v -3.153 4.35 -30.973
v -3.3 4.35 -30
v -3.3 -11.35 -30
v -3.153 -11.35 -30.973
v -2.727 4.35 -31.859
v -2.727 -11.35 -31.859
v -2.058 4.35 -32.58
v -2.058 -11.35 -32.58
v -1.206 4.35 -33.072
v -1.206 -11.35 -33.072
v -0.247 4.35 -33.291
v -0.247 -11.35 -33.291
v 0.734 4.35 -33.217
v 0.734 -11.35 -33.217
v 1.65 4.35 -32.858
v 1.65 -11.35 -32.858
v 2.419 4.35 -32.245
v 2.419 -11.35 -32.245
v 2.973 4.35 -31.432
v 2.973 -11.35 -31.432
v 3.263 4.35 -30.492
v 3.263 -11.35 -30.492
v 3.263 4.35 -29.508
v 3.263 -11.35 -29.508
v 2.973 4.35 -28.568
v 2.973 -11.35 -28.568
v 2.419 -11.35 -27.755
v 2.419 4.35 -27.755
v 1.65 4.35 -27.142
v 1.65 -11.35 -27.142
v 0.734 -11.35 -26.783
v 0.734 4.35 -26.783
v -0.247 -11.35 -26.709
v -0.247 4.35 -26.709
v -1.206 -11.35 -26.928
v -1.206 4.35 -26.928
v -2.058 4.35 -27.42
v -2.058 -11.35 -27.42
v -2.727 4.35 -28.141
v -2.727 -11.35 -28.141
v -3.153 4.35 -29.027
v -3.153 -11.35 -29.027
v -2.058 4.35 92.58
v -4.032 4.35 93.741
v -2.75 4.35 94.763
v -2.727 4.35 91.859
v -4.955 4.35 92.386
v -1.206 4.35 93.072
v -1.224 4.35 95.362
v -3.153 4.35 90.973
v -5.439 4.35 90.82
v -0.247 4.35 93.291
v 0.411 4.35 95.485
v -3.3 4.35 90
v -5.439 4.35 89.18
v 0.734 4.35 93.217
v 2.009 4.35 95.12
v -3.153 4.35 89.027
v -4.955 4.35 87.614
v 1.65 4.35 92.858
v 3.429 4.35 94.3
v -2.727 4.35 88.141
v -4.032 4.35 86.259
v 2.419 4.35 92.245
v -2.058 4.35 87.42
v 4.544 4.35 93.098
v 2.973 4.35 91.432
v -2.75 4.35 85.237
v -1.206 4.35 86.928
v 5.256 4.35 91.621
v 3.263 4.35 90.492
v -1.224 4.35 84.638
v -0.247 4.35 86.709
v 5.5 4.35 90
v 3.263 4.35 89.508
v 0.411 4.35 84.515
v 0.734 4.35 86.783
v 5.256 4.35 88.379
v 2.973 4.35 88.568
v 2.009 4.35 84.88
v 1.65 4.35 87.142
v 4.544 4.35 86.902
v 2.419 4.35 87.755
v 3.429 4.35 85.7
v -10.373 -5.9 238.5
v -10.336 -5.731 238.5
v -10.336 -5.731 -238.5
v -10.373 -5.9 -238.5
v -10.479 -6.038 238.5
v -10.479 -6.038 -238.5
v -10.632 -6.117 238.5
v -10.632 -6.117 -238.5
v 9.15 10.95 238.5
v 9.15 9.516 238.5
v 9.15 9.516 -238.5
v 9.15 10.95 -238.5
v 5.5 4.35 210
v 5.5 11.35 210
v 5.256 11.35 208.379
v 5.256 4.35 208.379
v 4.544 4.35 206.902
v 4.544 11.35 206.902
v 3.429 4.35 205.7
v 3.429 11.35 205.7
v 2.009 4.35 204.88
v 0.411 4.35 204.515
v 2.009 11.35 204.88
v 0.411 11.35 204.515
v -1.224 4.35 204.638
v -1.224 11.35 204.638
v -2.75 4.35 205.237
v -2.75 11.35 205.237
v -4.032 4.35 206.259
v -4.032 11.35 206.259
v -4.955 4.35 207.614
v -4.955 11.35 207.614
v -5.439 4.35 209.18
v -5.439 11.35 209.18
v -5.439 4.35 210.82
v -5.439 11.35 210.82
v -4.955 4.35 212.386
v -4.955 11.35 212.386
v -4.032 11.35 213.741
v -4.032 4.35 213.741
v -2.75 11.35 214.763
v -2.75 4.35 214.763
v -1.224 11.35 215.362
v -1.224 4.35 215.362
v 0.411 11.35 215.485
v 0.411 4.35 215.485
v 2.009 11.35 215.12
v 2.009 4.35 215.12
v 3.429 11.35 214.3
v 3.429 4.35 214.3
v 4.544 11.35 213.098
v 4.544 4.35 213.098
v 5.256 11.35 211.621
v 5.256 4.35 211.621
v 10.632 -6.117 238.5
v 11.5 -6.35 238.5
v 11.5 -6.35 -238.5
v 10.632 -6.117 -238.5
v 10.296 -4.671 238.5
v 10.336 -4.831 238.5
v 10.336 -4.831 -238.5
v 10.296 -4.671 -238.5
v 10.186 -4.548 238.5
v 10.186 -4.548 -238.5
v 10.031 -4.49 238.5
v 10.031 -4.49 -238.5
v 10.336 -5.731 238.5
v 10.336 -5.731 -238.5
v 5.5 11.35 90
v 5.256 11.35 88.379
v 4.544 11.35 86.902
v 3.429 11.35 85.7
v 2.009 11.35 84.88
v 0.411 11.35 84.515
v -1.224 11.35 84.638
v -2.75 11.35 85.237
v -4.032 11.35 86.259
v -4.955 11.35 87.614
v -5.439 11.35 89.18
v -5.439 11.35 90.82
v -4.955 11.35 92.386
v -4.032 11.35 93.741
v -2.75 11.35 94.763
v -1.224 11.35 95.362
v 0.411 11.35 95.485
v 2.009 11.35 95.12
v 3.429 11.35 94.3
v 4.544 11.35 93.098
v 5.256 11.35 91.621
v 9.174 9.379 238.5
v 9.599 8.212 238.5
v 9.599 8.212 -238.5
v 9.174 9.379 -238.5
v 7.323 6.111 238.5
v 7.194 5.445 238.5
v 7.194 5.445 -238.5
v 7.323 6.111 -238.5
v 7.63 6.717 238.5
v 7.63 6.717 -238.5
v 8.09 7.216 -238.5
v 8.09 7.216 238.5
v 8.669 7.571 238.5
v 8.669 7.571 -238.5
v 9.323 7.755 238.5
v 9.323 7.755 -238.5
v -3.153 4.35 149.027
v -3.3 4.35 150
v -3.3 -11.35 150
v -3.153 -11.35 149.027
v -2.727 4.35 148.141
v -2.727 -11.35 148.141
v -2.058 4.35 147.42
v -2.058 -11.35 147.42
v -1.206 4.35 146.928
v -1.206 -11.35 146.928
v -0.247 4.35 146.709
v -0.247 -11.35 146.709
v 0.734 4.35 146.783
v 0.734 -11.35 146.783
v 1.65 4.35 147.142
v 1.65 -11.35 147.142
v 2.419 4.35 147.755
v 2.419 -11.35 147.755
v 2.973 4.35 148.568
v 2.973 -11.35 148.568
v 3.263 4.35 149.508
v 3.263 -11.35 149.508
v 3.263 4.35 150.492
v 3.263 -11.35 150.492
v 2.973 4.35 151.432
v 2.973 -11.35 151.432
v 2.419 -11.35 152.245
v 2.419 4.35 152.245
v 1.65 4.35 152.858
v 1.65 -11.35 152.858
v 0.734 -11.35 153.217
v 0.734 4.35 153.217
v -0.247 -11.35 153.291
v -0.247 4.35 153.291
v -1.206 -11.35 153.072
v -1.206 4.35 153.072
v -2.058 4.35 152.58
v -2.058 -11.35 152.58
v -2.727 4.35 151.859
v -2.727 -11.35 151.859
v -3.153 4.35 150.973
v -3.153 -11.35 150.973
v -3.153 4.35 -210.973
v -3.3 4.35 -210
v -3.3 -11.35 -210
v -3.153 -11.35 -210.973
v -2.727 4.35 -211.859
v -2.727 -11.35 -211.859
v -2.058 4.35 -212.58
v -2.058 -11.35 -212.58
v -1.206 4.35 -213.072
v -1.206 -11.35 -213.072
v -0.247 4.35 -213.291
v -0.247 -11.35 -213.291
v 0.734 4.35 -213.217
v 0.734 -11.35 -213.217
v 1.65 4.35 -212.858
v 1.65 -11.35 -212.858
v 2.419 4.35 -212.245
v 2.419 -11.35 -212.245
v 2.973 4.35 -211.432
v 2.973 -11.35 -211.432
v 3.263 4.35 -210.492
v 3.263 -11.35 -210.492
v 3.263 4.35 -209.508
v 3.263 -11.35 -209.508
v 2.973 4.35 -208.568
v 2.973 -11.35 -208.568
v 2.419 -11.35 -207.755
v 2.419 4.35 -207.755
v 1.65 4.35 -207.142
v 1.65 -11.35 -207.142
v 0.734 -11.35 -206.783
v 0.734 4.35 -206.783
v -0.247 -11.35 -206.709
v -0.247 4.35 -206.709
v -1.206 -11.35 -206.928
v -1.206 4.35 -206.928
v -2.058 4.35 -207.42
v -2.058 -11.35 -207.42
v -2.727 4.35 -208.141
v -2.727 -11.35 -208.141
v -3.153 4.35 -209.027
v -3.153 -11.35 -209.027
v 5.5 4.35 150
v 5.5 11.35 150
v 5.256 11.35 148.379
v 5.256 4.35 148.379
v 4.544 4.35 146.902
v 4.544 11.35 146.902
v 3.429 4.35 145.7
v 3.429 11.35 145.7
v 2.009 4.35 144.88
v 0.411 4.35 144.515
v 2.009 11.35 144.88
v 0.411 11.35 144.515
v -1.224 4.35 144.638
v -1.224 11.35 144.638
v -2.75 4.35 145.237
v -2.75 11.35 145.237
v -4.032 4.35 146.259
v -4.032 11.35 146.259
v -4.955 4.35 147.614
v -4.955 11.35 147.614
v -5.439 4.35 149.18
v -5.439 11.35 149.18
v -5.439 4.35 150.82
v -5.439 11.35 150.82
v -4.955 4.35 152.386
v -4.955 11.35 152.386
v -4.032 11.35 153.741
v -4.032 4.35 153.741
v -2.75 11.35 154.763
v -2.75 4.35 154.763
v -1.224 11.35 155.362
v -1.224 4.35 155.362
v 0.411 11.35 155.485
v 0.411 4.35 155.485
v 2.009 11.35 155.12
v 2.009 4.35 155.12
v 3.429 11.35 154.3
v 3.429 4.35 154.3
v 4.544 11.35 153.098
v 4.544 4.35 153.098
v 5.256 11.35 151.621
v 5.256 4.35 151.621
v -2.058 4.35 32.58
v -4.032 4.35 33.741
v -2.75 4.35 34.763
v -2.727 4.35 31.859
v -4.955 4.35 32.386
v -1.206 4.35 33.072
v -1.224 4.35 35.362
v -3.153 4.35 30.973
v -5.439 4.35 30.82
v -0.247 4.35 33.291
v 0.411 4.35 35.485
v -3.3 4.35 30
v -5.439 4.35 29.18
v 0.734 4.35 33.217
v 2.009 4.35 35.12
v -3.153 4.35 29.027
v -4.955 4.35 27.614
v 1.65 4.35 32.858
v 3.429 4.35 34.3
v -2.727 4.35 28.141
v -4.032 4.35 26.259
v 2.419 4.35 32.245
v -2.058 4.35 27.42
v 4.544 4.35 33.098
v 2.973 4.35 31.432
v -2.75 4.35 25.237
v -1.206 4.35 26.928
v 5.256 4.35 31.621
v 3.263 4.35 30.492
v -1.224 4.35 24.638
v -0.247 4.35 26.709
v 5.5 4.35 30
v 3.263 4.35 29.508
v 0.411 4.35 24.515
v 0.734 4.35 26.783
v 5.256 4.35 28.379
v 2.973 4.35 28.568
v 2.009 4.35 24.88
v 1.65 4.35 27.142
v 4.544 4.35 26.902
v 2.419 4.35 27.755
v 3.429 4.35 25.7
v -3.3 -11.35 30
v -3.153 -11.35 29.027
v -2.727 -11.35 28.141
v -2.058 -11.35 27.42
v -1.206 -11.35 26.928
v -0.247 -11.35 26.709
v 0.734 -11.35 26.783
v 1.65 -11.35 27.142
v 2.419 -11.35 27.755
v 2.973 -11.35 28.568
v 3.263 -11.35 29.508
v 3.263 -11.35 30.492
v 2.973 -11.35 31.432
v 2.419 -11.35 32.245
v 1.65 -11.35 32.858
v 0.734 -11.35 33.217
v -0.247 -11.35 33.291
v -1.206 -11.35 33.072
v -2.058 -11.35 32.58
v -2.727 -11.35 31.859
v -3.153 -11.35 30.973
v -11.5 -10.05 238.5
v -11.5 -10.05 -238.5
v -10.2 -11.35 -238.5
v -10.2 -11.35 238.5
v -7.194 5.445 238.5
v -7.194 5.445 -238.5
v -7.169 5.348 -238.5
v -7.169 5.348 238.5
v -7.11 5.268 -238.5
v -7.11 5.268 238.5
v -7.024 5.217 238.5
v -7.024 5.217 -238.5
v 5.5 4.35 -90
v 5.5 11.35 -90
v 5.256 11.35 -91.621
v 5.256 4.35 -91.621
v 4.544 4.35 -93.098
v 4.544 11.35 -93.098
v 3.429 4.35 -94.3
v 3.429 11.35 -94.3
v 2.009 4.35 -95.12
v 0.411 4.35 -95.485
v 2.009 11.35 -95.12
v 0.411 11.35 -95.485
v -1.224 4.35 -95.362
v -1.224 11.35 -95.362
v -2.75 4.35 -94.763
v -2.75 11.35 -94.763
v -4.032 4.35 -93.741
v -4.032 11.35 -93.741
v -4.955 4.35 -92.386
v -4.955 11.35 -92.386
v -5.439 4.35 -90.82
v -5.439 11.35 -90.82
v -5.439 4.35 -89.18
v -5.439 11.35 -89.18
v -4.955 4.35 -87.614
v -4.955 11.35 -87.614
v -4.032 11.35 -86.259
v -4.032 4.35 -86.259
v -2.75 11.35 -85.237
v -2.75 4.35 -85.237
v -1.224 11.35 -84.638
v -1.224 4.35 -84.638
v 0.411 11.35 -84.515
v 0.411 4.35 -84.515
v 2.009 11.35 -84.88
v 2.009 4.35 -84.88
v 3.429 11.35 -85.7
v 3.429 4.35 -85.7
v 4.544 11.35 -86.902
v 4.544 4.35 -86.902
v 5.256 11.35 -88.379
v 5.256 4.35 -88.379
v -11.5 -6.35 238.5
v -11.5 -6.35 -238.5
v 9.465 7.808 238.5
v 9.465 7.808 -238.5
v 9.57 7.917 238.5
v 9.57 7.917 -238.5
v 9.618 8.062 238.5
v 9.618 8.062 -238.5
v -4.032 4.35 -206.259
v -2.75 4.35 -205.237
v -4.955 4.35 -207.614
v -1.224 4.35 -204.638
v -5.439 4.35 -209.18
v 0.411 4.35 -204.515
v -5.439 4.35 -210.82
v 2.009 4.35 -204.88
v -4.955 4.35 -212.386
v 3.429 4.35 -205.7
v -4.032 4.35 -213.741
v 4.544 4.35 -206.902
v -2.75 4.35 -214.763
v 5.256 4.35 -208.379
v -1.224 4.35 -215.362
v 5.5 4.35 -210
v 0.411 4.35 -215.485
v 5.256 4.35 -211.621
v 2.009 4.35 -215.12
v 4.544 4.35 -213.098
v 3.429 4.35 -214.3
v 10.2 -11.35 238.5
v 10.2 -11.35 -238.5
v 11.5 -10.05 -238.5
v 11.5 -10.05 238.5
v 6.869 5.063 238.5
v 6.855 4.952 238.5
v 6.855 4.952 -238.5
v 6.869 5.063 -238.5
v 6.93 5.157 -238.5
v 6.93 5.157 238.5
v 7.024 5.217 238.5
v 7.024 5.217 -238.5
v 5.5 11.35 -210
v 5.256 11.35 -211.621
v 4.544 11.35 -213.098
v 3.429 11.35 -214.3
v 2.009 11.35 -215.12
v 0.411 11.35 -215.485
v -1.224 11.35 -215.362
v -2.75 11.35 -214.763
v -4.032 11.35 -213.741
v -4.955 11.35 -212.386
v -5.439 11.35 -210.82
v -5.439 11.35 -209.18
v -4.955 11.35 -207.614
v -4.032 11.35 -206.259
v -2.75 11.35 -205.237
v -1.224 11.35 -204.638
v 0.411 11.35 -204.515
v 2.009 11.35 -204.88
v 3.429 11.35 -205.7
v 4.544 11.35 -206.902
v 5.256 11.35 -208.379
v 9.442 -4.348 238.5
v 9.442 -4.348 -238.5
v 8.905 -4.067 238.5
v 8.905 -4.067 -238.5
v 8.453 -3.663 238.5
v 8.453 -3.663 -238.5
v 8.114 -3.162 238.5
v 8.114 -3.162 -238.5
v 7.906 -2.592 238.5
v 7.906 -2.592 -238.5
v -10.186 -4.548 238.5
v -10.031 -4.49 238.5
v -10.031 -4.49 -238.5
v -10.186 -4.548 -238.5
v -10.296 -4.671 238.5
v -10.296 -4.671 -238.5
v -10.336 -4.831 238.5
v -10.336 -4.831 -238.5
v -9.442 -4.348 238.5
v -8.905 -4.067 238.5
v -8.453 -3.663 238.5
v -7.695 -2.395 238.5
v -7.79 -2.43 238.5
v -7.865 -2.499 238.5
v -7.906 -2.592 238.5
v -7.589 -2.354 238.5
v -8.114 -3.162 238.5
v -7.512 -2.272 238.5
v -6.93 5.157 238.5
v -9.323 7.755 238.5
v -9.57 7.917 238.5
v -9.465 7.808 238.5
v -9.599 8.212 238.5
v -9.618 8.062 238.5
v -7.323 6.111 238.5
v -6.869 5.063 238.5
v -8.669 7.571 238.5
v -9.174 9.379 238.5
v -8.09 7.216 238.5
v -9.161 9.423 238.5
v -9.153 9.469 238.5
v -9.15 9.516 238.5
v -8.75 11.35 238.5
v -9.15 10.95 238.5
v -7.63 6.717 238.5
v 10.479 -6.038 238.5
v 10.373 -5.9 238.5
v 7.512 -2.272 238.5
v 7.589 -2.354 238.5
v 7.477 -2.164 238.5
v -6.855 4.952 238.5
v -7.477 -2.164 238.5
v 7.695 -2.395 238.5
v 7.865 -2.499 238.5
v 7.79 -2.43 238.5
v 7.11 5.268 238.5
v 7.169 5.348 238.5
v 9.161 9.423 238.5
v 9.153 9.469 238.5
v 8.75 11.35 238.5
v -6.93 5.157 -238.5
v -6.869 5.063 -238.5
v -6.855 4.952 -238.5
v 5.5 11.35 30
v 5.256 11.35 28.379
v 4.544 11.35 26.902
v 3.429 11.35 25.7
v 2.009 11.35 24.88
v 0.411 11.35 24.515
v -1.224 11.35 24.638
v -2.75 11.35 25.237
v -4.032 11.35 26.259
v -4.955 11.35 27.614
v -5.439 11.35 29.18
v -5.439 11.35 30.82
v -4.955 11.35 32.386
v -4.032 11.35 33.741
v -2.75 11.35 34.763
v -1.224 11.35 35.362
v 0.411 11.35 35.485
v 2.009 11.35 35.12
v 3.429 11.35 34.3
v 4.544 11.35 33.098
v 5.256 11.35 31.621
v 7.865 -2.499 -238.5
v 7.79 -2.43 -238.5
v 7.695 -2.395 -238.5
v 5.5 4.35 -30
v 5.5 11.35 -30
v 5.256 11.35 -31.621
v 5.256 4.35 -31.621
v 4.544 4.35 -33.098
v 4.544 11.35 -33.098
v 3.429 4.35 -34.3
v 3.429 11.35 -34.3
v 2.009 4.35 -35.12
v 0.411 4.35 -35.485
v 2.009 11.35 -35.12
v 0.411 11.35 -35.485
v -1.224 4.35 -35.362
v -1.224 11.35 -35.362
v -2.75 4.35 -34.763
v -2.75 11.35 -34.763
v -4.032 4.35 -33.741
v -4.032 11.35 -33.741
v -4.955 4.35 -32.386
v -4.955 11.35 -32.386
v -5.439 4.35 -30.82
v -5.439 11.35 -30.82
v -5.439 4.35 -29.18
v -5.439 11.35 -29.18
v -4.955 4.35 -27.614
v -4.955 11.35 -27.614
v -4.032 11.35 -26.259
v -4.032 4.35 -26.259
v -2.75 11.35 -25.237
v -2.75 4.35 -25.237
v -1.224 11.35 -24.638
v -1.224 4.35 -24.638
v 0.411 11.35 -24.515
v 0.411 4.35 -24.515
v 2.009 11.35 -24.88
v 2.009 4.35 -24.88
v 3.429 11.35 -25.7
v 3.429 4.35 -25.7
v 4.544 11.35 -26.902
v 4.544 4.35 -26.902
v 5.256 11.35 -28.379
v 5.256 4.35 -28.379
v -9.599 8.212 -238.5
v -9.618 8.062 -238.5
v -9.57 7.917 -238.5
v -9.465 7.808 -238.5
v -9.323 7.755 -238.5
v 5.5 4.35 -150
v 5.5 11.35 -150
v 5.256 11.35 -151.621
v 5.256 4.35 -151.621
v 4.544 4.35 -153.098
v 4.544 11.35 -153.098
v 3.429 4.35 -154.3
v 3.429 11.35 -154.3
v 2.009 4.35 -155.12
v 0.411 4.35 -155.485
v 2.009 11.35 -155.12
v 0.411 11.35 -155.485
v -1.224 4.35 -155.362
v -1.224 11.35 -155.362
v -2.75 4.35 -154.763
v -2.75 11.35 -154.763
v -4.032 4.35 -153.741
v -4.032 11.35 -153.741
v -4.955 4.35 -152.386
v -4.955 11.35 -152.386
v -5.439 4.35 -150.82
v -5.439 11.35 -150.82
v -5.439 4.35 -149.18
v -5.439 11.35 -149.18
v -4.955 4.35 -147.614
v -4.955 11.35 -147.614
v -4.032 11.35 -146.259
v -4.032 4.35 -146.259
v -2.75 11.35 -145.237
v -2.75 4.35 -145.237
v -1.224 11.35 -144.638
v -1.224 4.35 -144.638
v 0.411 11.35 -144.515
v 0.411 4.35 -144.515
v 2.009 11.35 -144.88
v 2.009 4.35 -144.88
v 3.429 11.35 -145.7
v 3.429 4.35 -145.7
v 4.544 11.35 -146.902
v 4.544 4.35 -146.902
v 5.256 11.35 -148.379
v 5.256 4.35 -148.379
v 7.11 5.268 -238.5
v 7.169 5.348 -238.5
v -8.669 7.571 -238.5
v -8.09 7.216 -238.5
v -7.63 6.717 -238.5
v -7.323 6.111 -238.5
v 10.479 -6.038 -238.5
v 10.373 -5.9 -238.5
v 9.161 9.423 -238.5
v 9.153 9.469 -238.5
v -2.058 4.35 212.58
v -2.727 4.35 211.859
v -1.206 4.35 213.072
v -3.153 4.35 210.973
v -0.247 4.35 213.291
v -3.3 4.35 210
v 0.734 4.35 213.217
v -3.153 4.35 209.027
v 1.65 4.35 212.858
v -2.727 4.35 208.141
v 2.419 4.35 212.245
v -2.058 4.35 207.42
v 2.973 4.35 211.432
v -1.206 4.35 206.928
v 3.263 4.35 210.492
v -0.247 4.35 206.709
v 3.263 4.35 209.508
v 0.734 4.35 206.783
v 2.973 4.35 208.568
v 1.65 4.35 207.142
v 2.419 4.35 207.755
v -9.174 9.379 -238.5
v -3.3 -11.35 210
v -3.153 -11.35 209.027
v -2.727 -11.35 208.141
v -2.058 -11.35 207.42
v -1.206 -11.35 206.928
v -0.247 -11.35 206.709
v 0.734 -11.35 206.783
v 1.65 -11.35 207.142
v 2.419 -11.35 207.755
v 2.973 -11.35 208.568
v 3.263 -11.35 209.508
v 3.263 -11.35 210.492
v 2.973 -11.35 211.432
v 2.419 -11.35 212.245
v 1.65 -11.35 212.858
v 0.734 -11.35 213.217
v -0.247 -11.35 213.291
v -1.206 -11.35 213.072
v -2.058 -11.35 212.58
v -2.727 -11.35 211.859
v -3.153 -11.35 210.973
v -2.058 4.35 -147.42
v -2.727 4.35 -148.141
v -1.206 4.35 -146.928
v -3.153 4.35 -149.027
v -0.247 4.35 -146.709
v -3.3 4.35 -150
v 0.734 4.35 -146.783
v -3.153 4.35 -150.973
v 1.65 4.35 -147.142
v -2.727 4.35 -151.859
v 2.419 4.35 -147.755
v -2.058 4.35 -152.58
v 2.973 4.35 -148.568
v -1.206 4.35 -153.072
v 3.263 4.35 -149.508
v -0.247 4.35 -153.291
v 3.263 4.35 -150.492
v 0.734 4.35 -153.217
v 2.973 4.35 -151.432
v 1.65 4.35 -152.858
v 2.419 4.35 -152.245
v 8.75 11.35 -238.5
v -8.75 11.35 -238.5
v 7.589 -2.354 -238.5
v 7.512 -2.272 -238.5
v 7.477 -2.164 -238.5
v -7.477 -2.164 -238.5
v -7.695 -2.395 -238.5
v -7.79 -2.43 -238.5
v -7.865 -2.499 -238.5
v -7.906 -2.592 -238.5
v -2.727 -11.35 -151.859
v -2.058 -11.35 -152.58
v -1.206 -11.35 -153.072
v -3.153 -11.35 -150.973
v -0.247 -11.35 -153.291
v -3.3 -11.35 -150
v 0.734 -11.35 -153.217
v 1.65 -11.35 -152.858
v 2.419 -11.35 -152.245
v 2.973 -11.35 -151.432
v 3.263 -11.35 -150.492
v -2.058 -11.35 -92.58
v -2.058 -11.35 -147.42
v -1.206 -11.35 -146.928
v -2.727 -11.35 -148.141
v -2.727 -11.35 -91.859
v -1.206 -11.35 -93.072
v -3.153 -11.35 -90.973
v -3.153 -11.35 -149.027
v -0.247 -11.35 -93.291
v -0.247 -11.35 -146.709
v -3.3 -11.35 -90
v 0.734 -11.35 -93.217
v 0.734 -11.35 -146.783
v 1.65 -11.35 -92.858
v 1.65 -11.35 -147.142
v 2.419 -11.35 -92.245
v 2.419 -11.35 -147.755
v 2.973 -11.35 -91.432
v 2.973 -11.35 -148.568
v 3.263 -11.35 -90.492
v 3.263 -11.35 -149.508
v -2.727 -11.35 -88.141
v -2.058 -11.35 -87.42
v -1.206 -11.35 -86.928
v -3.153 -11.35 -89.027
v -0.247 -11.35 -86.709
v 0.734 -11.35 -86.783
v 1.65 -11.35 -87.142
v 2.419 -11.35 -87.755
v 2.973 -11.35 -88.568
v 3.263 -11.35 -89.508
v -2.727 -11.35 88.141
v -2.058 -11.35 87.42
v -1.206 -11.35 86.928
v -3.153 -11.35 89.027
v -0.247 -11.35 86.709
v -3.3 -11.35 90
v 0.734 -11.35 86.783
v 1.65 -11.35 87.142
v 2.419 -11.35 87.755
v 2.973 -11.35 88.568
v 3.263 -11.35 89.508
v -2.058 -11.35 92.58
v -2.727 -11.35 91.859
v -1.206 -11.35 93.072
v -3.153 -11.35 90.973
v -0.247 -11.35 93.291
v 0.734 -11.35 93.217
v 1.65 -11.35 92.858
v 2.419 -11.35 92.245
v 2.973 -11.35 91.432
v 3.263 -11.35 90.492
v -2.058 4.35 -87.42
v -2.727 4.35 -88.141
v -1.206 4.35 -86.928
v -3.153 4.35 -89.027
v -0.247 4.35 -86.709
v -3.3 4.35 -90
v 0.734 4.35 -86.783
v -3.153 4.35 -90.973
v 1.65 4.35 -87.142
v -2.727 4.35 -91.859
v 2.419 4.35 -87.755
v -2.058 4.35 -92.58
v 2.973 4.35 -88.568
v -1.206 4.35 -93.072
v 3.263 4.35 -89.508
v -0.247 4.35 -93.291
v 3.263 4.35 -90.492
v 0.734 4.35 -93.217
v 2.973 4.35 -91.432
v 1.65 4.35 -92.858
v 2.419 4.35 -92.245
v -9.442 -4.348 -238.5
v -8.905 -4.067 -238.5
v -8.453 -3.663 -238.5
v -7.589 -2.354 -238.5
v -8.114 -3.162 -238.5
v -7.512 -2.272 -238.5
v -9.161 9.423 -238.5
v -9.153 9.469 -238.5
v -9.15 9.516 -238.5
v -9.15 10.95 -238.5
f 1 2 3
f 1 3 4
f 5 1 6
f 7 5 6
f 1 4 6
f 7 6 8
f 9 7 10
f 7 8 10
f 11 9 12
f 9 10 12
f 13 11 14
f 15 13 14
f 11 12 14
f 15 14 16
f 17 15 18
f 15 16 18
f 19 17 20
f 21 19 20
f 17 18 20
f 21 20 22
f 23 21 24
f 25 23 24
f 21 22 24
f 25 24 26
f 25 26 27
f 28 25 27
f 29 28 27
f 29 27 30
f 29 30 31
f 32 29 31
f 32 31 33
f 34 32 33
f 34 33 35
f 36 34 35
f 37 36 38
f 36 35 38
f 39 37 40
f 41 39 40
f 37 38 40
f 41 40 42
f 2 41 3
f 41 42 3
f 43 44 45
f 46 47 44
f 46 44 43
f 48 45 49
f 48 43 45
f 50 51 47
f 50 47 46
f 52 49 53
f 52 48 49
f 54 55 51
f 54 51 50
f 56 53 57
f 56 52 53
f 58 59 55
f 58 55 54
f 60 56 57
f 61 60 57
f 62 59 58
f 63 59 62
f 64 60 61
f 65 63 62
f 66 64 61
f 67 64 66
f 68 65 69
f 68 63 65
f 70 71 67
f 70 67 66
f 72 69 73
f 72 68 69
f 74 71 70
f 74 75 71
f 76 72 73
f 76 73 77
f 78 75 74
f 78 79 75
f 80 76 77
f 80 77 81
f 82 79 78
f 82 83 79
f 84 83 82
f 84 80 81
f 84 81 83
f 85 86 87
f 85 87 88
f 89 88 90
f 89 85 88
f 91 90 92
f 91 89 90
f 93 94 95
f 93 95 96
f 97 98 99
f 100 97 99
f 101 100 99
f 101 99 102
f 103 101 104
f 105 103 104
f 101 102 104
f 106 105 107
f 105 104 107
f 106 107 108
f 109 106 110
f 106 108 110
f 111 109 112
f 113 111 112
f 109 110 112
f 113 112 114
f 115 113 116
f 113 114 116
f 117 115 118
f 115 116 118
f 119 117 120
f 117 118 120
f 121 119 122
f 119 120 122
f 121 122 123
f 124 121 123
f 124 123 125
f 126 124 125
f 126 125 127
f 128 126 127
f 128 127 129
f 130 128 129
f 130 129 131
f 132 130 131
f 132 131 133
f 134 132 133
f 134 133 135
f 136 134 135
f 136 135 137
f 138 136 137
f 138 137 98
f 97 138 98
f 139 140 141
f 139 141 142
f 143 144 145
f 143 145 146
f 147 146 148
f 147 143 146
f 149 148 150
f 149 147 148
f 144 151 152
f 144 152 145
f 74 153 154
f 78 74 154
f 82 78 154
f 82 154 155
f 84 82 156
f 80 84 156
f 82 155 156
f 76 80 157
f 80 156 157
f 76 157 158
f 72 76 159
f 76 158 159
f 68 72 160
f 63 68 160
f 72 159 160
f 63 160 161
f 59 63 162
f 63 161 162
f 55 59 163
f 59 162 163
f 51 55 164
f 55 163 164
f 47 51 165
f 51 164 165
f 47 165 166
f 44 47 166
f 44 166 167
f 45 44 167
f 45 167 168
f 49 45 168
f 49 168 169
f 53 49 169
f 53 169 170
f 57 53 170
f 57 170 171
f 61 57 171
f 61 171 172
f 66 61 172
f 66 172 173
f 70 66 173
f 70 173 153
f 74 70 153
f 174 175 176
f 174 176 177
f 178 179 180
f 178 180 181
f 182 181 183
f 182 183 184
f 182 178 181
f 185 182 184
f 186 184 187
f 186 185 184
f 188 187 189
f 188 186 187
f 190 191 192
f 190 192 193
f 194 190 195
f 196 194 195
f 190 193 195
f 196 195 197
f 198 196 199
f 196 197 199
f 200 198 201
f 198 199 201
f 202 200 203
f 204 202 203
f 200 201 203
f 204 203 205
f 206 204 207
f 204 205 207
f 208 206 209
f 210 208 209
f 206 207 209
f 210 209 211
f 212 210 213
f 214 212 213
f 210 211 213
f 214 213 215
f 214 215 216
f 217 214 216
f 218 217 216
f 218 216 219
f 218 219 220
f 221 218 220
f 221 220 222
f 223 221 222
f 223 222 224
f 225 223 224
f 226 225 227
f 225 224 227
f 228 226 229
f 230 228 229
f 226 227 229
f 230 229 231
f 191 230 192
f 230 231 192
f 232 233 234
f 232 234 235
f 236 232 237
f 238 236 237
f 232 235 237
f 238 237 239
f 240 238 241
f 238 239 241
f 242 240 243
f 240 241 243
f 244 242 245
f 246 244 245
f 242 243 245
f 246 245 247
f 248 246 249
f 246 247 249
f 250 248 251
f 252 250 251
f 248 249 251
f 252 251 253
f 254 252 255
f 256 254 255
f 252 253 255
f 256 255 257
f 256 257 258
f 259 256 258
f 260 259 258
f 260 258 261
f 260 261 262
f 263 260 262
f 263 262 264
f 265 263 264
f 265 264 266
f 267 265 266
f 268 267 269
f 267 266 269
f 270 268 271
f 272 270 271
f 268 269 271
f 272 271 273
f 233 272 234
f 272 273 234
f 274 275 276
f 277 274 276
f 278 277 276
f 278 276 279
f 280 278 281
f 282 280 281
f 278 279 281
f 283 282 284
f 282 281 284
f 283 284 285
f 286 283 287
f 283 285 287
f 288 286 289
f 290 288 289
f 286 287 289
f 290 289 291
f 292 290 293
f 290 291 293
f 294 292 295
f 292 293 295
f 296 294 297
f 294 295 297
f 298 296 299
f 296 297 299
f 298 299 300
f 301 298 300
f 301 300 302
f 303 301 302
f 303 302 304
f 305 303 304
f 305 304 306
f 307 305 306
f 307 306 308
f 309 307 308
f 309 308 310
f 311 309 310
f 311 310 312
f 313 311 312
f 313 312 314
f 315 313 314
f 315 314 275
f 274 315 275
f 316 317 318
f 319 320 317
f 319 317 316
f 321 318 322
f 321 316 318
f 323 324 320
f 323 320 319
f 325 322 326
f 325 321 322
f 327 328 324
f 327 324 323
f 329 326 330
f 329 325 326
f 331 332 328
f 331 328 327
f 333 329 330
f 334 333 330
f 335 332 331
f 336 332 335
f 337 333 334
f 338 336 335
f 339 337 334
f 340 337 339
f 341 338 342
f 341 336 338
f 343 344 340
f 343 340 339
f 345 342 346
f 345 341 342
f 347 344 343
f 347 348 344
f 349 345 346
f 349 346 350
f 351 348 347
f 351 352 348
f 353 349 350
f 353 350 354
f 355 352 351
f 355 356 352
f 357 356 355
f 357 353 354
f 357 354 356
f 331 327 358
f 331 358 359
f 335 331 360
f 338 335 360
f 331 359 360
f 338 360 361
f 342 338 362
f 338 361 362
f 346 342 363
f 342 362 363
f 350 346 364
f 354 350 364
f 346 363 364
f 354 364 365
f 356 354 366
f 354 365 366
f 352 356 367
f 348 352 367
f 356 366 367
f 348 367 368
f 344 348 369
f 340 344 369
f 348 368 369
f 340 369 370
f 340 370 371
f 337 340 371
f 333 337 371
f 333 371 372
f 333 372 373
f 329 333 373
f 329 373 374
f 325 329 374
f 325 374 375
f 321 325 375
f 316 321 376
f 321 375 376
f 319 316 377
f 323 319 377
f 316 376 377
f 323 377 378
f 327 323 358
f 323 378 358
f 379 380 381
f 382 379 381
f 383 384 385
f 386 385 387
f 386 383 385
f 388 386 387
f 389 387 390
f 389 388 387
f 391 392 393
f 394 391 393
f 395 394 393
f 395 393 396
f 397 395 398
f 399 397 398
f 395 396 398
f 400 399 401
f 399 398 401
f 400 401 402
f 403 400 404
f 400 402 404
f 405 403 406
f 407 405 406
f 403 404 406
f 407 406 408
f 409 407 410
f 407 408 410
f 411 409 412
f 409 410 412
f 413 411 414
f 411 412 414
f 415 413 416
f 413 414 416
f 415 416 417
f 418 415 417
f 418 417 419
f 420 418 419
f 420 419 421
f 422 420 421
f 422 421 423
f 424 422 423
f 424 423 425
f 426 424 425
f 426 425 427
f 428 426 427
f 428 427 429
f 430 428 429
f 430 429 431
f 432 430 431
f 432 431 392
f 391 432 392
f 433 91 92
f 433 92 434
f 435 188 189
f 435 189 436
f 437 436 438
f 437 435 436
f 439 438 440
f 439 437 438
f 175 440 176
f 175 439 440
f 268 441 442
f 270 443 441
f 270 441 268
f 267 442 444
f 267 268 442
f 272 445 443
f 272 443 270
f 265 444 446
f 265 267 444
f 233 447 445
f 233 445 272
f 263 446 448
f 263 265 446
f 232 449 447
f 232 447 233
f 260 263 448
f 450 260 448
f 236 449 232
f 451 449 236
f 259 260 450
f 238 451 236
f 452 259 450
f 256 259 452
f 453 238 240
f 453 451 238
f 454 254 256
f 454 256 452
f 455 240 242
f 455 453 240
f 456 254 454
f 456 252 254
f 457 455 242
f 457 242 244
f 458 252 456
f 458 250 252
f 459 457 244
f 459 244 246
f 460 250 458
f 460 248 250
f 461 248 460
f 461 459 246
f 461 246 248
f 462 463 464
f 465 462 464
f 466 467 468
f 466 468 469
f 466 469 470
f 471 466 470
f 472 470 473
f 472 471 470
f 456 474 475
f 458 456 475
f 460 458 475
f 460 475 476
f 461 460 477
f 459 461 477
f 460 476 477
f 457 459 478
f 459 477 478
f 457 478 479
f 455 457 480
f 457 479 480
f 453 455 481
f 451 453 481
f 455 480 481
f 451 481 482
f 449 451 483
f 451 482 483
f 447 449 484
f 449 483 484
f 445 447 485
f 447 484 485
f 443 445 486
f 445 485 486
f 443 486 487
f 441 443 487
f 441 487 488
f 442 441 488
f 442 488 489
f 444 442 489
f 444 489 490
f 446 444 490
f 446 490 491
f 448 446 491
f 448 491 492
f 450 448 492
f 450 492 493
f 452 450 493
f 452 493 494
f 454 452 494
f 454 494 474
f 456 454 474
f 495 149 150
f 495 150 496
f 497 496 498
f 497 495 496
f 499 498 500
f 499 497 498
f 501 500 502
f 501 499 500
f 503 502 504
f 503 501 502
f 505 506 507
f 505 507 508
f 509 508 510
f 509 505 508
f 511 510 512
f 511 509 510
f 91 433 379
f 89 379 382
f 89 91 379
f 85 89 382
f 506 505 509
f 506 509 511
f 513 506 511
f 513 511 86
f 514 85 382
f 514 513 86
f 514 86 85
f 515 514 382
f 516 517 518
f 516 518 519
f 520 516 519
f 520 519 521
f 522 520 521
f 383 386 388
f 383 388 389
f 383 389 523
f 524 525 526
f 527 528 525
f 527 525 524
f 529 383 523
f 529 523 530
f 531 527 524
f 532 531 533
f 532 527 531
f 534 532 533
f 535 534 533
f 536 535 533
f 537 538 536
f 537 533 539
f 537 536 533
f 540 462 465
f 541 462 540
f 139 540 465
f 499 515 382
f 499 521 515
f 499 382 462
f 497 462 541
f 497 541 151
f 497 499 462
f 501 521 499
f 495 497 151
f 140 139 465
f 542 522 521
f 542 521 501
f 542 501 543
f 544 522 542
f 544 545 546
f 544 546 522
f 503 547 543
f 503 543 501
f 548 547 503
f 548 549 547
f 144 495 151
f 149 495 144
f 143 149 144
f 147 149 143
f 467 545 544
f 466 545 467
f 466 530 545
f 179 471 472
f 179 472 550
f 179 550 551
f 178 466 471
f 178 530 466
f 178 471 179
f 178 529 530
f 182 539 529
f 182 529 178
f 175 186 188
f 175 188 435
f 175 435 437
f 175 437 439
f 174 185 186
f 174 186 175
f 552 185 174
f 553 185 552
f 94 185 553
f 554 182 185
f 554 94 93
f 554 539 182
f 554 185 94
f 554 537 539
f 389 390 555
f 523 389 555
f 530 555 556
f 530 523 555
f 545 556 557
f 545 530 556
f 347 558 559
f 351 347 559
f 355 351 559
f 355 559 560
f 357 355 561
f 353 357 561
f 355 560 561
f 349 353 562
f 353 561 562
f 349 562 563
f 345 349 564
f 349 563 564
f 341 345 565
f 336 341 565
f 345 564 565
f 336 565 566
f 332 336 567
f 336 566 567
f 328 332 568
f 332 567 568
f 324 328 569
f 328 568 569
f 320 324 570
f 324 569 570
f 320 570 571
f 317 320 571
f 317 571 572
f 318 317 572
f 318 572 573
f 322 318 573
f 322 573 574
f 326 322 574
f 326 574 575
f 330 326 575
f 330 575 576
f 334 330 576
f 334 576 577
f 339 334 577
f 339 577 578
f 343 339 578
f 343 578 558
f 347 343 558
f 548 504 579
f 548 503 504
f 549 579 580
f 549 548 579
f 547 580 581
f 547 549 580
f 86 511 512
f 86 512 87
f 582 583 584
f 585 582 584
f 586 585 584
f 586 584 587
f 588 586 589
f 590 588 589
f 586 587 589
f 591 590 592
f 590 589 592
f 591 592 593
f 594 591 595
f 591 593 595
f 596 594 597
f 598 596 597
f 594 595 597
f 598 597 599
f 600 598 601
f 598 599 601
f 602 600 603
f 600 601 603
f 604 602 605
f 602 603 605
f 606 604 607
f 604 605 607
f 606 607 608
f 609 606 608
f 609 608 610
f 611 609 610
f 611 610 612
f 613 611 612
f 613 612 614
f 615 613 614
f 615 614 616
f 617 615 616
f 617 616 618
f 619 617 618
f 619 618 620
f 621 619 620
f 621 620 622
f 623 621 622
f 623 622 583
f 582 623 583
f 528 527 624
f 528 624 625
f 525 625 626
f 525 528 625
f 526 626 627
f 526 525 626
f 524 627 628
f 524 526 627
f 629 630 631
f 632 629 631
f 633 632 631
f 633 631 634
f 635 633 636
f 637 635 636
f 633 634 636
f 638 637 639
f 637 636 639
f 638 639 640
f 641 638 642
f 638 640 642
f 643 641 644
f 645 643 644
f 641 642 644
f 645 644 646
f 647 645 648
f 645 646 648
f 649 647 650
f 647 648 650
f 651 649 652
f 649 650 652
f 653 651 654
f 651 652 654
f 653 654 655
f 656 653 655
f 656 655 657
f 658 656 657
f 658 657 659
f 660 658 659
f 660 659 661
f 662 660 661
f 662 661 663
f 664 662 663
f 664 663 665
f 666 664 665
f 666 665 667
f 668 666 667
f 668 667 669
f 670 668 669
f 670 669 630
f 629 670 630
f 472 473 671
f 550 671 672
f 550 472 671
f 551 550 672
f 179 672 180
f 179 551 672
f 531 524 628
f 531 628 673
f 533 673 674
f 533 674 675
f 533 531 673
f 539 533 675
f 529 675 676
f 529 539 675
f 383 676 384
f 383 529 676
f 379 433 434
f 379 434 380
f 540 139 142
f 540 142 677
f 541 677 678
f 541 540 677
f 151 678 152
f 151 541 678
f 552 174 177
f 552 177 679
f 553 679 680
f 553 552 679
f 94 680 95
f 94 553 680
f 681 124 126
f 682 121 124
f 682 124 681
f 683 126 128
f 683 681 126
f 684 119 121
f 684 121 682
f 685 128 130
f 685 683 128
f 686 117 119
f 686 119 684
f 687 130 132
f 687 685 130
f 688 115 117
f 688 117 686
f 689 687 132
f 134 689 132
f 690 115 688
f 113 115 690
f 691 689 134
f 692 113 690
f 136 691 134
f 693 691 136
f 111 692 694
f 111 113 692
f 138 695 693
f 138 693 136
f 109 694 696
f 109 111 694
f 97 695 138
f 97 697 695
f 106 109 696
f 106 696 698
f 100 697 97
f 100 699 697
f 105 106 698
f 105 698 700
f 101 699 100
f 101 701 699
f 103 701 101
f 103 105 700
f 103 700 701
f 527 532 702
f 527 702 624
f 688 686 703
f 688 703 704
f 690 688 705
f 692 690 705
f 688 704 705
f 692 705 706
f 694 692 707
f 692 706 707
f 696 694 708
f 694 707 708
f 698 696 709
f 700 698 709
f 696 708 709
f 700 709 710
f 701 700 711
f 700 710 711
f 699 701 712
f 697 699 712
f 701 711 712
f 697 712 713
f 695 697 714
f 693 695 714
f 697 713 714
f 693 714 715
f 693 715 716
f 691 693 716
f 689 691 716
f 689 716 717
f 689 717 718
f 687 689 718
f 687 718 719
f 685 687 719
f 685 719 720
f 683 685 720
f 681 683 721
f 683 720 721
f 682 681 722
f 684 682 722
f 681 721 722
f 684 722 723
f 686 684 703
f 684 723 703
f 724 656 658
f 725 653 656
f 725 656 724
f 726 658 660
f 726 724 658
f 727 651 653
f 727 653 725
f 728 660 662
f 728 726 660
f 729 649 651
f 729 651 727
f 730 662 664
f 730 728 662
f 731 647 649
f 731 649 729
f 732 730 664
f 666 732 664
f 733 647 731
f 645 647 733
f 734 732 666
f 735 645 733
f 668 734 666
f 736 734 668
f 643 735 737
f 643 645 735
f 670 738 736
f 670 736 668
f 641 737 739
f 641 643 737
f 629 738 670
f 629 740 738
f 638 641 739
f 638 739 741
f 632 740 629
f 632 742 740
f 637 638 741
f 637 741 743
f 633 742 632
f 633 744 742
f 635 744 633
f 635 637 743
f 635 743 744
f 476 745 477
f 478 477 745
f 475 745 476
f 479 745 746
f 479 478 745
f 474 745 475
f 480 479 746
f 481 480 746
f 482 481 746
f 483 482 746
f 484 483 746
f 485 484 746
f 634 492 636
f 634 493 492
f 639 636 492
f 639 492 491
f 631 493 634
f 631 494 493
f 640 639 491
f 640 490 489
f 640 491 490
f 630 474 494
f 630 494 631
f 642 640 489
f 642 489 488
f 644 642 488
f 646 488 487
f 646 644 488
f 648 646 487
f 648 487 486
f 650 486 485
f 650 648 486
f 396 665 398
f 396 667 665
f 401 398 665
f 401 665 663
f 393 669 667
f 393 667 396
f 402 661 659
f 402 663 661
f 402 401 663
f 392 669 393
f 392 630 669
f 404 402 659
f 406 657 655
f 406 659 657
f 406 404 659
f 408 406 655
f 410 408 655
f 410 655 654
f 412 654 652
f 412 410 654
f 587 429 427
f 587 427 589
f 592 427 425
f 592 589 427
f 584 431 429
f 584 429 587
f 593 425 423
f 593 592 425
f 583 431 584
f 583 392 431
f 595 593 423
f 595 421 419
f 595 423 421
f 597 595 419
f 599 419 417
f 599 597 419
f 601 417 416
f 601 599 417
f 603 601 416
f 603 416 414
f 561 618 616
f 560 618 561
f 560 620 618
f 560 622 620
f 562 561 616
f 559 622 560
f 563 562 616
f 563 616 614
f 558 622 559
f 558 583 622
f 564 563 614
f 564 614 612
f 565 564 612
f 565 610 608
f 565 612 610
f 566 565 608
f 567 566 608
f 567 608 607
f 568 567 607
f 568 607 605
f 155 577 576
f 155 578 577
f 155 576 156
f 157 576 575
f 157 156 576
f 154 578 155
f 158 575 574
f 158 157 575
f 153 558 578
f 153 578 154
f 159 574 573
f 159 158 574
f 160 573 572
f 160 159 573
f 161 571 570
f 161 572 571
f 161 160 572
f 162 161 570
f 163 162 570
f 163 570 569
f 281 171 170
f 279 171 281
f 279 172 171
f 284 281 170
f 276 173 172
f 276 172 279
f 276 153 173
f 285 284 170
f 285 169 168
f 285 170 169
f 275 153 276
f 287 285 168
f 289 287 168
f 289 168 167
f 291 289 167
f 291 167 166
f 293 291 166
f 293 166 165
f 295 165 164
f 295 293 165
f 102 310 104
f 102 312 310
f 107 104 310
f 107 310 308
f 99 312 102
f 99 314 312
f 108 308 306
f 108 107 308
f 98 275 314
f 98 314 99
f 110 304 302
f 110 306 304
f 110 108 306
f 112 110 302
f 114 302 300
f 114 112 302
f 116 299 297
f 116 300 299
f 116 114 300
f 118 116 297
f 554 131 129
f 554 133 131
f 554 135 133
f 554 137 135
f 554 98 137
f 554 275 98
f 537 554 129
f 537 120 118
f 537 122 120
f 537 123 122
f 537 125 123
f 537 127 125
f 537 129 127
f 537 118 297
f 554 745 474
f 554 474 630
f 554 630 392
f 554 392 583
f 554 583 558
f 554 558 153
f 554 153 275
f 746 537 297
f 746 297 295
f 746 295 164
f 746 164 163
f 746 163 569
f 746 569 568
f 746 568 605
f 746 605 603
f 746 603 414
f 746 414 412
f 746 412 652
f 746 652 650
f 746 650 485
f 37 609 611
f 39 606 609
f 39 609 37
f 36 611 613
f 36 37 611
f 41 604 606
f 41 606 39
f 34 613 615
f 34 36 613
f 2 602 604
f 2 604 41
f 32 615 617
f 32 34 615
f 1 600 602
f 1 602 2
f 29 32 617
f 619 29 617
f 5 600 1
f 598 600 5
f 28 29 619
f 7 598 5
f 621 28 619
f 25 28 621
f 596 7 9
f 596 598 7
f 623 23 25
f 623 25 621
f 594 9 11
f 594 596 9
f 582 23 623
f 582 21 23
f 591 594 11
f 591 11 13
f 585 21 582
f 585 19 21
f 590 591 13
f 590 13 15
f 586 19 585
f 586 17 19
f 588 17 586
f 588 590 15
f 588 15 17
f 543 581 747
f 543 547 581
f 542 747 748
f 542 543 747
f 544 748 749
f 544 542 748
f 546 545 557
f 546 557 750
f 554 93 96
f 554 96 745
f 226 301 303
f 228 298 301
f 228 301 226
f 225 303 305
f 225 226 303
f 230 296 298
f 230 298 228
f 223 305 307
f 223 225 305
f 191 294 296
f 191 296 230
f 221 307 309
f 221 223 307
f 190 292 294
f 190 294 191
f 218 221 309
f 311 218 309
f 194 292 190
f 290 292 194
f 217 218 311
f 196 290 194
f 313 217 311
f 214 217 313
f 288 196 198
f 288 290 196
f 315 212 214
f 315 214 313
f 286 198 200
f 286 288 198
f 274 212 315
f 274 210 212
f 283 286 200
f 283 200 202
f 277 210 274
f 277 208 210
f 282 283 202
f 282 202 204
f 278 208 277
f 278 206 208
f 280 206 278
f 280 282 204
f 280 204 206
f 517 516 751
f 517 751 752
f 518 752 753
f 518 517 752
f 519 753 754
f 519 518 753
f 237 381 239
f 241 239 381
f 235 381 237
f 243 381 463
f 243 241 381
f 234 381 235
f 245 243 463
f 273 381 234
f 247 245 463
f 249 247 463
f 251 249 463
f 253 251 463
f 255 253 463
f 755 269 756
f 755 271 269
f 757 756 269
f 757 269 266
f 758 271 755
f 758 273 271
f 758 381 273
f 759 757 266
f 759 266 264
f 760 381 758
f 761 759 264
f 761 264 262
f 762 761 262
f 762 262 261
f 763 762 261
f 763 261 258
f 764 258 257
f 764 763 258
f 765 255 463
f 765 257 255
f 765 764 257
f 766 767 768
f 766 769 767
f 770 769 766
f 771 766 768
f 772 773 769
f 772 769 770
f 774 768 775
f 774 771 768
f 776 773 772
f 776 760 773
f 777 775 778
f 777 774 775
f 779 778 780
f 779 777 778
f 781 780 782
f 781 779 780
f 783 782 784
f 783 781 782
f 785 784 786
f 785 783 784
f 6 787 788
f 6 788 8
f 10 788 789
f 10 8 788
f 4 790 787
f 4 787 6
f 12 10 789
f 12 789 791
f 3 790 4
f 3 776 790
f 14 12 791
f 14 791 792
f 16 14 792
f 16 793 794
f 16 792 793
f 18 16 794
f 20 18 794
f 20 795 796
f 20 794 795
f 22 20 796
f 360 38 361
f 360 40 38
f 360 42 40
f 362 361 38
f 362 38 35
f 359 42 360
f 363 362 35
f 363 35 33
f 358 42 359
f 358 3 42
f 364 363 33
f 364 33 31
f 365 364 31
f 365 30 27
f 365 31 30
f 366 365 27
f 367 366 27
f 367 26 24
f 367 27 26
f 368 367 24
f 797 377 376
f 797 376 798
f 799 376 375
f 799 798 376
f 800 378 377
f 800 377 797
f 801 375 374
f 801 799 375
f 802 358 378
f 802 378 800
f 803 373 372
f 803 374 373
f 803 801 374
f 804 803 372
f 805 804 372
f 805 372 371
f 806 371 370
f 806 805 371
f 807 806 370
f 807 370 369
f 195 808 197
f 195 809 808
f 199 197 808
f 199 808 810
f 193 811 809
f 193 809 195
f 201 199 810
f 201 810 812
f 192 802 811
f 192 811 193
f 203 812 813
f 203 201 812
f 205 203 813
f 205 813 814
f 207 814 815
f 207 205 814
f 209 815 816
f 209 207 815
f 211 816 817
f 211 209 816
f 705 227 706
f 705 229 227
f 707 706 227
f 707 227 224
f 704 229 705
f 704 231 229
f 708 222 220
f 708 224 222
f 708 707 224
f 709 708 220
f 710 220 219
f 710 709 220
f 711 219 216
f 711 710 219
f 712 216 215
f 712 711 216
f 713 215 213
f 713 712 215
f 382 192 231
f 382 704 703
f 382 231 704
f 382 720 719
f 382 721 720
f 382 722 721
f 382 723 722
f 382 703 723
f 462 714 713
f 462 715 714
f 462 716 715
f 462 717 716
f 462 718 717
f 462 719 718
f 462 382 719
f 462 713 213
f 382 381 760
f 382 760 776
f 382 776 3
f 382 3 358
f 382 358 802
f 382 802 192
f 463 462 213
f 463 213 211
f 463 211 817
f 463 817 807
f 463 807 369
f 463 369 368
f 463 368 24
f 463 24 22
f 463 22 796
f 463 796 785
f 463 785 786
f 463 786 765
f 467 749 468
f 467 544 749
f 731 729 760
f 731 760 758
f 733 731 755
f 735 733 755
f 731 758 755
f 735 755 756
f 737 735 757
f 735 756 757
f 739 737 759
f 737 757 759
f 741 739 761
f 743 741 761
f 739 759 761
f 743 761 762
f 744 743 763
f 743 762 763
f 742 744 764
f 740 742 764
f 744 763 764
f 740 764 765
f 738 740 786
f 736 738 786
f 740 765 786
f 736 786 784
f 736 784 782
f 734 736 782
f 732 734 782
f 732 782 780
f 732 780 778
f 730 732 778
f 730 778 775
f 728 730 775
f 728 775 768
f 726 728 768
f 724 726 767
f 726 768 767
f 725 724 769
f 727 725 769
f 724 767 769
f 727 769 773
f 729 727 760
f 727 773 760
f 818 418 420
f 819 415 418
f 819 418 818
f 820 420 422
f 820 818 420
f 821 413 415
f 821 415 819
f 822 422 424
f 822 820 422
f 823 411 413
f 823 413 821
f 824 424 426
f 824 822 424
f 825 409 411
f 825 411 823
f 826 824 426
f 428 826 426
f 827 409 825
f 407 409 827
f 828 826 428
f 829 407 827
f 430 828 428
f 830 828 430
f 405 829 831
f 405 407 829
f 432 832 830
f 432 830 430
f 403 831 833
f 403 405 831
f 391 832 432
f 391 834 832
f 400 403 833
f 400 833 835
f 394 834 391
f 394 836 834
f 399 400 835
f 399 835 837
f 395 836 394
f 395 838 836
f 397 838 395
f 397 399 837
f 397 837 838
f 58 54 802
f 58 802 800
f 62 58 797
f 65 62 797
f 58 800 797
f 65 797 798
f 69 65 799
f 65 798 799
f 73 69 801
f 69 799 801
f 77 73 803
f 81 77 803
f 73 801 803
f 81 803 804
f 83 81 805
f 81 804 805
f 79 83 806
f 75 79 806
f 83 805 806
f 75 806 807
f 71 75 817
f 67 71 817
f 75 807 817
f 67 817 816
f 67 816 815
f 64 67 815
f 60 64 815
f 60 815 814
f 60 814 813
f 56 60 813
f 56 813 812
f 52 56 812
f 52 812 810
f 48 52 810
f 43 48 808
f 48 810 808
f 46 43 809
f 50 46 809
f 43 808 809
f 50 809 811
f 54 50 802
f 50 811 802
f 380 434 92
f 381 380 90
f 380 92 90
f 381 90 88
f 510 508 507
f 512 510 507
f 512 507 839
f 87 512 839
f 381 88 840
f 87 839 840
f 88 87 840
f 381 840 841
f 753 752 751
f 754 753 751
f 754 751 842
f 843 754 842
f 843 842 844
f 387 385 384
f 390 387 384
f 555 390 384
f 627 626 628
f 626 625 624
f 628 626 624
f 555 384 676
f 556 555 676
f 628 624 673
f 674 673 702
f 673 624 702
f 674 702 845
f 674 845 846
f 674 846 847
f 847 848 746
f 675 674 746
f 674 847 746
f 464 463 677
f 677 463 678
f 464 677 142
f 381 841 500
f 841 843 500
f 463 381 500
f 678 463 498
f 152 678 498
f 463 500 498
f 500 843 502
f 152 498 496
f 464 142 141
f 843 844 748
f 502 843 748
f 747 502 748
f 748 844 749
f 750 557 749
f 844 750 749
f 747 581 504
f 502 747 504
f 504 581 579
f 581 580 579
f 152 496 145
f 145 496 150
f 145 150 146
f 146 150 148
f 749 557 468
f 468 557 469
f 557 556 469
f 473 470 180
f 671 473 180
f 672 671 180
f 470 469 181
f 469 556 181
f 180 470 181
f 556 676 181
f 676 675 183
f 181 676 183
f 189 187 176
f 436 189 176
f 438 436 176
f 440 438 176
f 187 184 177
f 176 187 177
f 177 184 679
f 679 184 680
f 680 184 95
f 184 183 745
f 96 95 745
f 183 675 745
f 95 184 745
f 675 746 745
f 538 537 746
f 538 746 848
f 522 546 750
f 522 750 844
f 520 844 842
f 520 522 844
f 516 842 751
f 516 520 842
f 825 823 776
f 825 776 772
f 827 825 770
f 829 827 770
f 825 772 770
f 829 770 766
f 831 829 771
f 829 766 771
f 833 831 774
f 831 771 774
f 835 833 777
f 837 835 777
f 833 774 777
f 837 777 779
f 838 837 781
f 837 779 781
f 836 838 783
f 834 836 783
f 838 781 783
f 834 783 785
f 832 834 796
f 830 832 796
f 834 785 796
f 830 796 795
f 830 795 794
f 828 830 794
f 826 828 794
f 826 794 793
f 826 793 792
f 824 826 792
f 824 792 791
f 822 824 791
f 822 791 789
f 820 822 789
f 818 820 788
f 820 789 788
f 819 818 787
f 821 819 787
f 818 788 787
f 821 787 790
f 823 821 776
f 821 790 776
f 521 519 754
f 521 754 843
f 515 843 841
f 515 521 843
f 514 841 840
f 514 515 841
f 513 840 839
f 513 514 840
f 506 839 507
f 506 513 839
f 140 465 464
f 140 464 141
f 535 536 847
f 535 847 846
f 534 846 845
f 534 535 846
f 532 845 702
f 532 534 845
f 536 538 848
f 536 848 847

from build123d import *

# Parameters (mm, degrees)
EXTRUDE1_DEPTH                                      = 238.5
CBORE_FOR_M6_HEX_SOCKET_HEAD_CAP_SCREW1_D           = 6.6
CBORE_FOR_M6_HEX_SOCKET_HEAD_CAP_SCREW1_CBORE_D     = 11
CBORE_FOR_M6_HEX_SOCKET_HEAD_CAP_SCREW1_CBORE_DEPTH = 7
LPATTERN2_COUNT                                     = 8
LPATTERN2_PITCH                                     = 60


with BuildPart() as part:
    # Sketch1 → Extrude1 (new, symmetric)
    with BuildSketch(Plane.XY):
        with BuildLine():
            Line((7.477203841, -2.163774891), (6.854635535, 4.95221341))
            ThreePointArc((6.854635535, 4.95221341), (6.894238652, 5.113219257), (7.023920881, 5.216533386))
            ThreePointArc((7.023920881, 5.216533386), (7.143282835, 5.304921447), (7.19380984, 5.444588005))
            ThreePointArc((7.19380984, 5.444588005), (7.842791864, 6.982656014), (9.322818427, 7.754894477))
            ThreePointArc((9.322818427, 7.754894477), (9.570098719, 7.917497666), (9.598759922, 8.212058144))
            Line((9.598759922, 8.212058144), (9.174122952, 9.378738633))
            ThreePointArc((9.174122952, 9.378738633), (9.156076899, 9.446087419), (9.15, 9.51554669))
            Line((9.15, 9.51554669), (9.15, 10.95))
            Line((9.15, 10.95), (8.75, 11.35))
            Line((8.75, 11.35), (-8.75, 11.35))
            Line((-8.75, 11.35), (-9.15, 10.95))
            Line((-9.15, 10.95), (-9.15, 9.51554669))
            ThreePointArc((-9.15, 9.51554669), (-9.156076899, 9.446087419), (-9.174122952, 9.378738633))
            Line((-9.174122952, 9.378738633), (-9.598759922, 8.212058144))
            ThreePointArc((-9.598759922, 8.212058144), (-9.570098719, 7.917497666), (-9.322818427, 7.754894477))
            ThreePointArc((-9.322818427, 7.754894477), (-7.842791864, 6.982656014), (-7.19380984, 5.444588005))
            ThreePointArc((-7.19380984, 5.444588005), (-7.143282835, 5.304921447), (-7.023920881, 5.216533386))
            ThreePointArc((-7.023920881, 5.216533386), (-6.894238652, 5.113219257), (-6.854635535, 4.95221341))
            Line((-6.854635535, 4.95221341), (-7.477203841, -2.163774891))
            ThreePointArc((-7.477203841, -2.163774891), (-7.545812268, -2.317231314), (-7.694596885, -2.395456169))
            ThreePointArc((-7.694596885, -2.395456169), (-7.830767167, -2.461137392), (-7.906447862, -2.592014437))
            ThreePointArc((-7.906447862, -2.592014437), (-8.667010877, -3.879124842), (-10.031407356, -4.49029711))
            ThreePointArc((-10.031407356, -4.49029711), (-10.248539262, -4.602670084), (-10.3356733, -4.831103027))
            Line((-10.3356733, -4.831103027), (-10.3356733, -5.731088806))
            ThreePointArc((-10.3356733, -5.731088806), (-10.418331964, -5.974593377), (-10.632145682, -6.117459136))
            Line((-10.632145682, -6.117459136), (-11.5, -6.35))
            Line((-11.5, -6.35), (-11.5, -10.05))
            Line((-11.5, -10.05), (-10.2, -11.35))
            Line((-10.2, -11.35), (10.2, -11.35))
            Line((10.2, -11.35), (11.5, -10.05))
            Line((11.5, -10.05), (11.5, -6.35))
            Line((11.5, -6.35), (10.632145682, -6.117459136))
            ThreePointArc((10.632145682, -6.117459136), (10.418331964, -5.974593377), (10.3356733, -5.731088806))
            Line((10.3356733, -5.731088806), (10.3356733, -4.831103027))
            ThreePointArc((10.3356733, -4.831103027), (10.248539262, -4.602670084), (10.031407356, -4.49029711))
            ThreePointArc((10.031407356, -4.49029711), (8.667010877, -3.879124842), (7.906447862, -2.592014437))
            ThreePointArc((7.906447862, -2.592014437), (7.830767167, -2.461137392), (7.694596885, -2.395456169))
            ThreePointArc((7.694596885, -2.395456169), (7.545812268, -2.317231314), (7.477203841, -2.163774891))
        make_face()
    extrude(amount=EXTRUDE1_DEPTH, both=True)

    # CBORE for M6 Hex Socket Head Cap Screw1 (through all)
    with Locations(Plane(origin=(0, 11.35, 0), x_dir=(1, 0, 0), z_dir=(0, 1, 0))):
        with Locations((0, -210)):
            cbore_for_m6_hex_socket_head_cap_screw1 = CounterBoreHole(CBORE_FOR_M6_HEX_SOCKET_HEAD_CAP_SCREW1_D / 2, CBORE_FOR_M6_HEX_SOCKET_HEAD_CAP_SCREW1_CBORE_D / 2, CBORE_FOR_M6_HEX_SOCKET_HEAD_CAP_SCREW1_CBORE_DEPTH)

    # LPattern2: CBORE for M6 Hex Socket Head Cap Screw1 ×8
    with Locations(*[(0, 0, -i * LPATTERN2_PITCH) for i in range(1, LPATTERN2_COUNT)]):
        add(cbore_for_m6_hex_socket_head_cap_screw1, mode=Mode.SUBTRACT)


solid = part.part
